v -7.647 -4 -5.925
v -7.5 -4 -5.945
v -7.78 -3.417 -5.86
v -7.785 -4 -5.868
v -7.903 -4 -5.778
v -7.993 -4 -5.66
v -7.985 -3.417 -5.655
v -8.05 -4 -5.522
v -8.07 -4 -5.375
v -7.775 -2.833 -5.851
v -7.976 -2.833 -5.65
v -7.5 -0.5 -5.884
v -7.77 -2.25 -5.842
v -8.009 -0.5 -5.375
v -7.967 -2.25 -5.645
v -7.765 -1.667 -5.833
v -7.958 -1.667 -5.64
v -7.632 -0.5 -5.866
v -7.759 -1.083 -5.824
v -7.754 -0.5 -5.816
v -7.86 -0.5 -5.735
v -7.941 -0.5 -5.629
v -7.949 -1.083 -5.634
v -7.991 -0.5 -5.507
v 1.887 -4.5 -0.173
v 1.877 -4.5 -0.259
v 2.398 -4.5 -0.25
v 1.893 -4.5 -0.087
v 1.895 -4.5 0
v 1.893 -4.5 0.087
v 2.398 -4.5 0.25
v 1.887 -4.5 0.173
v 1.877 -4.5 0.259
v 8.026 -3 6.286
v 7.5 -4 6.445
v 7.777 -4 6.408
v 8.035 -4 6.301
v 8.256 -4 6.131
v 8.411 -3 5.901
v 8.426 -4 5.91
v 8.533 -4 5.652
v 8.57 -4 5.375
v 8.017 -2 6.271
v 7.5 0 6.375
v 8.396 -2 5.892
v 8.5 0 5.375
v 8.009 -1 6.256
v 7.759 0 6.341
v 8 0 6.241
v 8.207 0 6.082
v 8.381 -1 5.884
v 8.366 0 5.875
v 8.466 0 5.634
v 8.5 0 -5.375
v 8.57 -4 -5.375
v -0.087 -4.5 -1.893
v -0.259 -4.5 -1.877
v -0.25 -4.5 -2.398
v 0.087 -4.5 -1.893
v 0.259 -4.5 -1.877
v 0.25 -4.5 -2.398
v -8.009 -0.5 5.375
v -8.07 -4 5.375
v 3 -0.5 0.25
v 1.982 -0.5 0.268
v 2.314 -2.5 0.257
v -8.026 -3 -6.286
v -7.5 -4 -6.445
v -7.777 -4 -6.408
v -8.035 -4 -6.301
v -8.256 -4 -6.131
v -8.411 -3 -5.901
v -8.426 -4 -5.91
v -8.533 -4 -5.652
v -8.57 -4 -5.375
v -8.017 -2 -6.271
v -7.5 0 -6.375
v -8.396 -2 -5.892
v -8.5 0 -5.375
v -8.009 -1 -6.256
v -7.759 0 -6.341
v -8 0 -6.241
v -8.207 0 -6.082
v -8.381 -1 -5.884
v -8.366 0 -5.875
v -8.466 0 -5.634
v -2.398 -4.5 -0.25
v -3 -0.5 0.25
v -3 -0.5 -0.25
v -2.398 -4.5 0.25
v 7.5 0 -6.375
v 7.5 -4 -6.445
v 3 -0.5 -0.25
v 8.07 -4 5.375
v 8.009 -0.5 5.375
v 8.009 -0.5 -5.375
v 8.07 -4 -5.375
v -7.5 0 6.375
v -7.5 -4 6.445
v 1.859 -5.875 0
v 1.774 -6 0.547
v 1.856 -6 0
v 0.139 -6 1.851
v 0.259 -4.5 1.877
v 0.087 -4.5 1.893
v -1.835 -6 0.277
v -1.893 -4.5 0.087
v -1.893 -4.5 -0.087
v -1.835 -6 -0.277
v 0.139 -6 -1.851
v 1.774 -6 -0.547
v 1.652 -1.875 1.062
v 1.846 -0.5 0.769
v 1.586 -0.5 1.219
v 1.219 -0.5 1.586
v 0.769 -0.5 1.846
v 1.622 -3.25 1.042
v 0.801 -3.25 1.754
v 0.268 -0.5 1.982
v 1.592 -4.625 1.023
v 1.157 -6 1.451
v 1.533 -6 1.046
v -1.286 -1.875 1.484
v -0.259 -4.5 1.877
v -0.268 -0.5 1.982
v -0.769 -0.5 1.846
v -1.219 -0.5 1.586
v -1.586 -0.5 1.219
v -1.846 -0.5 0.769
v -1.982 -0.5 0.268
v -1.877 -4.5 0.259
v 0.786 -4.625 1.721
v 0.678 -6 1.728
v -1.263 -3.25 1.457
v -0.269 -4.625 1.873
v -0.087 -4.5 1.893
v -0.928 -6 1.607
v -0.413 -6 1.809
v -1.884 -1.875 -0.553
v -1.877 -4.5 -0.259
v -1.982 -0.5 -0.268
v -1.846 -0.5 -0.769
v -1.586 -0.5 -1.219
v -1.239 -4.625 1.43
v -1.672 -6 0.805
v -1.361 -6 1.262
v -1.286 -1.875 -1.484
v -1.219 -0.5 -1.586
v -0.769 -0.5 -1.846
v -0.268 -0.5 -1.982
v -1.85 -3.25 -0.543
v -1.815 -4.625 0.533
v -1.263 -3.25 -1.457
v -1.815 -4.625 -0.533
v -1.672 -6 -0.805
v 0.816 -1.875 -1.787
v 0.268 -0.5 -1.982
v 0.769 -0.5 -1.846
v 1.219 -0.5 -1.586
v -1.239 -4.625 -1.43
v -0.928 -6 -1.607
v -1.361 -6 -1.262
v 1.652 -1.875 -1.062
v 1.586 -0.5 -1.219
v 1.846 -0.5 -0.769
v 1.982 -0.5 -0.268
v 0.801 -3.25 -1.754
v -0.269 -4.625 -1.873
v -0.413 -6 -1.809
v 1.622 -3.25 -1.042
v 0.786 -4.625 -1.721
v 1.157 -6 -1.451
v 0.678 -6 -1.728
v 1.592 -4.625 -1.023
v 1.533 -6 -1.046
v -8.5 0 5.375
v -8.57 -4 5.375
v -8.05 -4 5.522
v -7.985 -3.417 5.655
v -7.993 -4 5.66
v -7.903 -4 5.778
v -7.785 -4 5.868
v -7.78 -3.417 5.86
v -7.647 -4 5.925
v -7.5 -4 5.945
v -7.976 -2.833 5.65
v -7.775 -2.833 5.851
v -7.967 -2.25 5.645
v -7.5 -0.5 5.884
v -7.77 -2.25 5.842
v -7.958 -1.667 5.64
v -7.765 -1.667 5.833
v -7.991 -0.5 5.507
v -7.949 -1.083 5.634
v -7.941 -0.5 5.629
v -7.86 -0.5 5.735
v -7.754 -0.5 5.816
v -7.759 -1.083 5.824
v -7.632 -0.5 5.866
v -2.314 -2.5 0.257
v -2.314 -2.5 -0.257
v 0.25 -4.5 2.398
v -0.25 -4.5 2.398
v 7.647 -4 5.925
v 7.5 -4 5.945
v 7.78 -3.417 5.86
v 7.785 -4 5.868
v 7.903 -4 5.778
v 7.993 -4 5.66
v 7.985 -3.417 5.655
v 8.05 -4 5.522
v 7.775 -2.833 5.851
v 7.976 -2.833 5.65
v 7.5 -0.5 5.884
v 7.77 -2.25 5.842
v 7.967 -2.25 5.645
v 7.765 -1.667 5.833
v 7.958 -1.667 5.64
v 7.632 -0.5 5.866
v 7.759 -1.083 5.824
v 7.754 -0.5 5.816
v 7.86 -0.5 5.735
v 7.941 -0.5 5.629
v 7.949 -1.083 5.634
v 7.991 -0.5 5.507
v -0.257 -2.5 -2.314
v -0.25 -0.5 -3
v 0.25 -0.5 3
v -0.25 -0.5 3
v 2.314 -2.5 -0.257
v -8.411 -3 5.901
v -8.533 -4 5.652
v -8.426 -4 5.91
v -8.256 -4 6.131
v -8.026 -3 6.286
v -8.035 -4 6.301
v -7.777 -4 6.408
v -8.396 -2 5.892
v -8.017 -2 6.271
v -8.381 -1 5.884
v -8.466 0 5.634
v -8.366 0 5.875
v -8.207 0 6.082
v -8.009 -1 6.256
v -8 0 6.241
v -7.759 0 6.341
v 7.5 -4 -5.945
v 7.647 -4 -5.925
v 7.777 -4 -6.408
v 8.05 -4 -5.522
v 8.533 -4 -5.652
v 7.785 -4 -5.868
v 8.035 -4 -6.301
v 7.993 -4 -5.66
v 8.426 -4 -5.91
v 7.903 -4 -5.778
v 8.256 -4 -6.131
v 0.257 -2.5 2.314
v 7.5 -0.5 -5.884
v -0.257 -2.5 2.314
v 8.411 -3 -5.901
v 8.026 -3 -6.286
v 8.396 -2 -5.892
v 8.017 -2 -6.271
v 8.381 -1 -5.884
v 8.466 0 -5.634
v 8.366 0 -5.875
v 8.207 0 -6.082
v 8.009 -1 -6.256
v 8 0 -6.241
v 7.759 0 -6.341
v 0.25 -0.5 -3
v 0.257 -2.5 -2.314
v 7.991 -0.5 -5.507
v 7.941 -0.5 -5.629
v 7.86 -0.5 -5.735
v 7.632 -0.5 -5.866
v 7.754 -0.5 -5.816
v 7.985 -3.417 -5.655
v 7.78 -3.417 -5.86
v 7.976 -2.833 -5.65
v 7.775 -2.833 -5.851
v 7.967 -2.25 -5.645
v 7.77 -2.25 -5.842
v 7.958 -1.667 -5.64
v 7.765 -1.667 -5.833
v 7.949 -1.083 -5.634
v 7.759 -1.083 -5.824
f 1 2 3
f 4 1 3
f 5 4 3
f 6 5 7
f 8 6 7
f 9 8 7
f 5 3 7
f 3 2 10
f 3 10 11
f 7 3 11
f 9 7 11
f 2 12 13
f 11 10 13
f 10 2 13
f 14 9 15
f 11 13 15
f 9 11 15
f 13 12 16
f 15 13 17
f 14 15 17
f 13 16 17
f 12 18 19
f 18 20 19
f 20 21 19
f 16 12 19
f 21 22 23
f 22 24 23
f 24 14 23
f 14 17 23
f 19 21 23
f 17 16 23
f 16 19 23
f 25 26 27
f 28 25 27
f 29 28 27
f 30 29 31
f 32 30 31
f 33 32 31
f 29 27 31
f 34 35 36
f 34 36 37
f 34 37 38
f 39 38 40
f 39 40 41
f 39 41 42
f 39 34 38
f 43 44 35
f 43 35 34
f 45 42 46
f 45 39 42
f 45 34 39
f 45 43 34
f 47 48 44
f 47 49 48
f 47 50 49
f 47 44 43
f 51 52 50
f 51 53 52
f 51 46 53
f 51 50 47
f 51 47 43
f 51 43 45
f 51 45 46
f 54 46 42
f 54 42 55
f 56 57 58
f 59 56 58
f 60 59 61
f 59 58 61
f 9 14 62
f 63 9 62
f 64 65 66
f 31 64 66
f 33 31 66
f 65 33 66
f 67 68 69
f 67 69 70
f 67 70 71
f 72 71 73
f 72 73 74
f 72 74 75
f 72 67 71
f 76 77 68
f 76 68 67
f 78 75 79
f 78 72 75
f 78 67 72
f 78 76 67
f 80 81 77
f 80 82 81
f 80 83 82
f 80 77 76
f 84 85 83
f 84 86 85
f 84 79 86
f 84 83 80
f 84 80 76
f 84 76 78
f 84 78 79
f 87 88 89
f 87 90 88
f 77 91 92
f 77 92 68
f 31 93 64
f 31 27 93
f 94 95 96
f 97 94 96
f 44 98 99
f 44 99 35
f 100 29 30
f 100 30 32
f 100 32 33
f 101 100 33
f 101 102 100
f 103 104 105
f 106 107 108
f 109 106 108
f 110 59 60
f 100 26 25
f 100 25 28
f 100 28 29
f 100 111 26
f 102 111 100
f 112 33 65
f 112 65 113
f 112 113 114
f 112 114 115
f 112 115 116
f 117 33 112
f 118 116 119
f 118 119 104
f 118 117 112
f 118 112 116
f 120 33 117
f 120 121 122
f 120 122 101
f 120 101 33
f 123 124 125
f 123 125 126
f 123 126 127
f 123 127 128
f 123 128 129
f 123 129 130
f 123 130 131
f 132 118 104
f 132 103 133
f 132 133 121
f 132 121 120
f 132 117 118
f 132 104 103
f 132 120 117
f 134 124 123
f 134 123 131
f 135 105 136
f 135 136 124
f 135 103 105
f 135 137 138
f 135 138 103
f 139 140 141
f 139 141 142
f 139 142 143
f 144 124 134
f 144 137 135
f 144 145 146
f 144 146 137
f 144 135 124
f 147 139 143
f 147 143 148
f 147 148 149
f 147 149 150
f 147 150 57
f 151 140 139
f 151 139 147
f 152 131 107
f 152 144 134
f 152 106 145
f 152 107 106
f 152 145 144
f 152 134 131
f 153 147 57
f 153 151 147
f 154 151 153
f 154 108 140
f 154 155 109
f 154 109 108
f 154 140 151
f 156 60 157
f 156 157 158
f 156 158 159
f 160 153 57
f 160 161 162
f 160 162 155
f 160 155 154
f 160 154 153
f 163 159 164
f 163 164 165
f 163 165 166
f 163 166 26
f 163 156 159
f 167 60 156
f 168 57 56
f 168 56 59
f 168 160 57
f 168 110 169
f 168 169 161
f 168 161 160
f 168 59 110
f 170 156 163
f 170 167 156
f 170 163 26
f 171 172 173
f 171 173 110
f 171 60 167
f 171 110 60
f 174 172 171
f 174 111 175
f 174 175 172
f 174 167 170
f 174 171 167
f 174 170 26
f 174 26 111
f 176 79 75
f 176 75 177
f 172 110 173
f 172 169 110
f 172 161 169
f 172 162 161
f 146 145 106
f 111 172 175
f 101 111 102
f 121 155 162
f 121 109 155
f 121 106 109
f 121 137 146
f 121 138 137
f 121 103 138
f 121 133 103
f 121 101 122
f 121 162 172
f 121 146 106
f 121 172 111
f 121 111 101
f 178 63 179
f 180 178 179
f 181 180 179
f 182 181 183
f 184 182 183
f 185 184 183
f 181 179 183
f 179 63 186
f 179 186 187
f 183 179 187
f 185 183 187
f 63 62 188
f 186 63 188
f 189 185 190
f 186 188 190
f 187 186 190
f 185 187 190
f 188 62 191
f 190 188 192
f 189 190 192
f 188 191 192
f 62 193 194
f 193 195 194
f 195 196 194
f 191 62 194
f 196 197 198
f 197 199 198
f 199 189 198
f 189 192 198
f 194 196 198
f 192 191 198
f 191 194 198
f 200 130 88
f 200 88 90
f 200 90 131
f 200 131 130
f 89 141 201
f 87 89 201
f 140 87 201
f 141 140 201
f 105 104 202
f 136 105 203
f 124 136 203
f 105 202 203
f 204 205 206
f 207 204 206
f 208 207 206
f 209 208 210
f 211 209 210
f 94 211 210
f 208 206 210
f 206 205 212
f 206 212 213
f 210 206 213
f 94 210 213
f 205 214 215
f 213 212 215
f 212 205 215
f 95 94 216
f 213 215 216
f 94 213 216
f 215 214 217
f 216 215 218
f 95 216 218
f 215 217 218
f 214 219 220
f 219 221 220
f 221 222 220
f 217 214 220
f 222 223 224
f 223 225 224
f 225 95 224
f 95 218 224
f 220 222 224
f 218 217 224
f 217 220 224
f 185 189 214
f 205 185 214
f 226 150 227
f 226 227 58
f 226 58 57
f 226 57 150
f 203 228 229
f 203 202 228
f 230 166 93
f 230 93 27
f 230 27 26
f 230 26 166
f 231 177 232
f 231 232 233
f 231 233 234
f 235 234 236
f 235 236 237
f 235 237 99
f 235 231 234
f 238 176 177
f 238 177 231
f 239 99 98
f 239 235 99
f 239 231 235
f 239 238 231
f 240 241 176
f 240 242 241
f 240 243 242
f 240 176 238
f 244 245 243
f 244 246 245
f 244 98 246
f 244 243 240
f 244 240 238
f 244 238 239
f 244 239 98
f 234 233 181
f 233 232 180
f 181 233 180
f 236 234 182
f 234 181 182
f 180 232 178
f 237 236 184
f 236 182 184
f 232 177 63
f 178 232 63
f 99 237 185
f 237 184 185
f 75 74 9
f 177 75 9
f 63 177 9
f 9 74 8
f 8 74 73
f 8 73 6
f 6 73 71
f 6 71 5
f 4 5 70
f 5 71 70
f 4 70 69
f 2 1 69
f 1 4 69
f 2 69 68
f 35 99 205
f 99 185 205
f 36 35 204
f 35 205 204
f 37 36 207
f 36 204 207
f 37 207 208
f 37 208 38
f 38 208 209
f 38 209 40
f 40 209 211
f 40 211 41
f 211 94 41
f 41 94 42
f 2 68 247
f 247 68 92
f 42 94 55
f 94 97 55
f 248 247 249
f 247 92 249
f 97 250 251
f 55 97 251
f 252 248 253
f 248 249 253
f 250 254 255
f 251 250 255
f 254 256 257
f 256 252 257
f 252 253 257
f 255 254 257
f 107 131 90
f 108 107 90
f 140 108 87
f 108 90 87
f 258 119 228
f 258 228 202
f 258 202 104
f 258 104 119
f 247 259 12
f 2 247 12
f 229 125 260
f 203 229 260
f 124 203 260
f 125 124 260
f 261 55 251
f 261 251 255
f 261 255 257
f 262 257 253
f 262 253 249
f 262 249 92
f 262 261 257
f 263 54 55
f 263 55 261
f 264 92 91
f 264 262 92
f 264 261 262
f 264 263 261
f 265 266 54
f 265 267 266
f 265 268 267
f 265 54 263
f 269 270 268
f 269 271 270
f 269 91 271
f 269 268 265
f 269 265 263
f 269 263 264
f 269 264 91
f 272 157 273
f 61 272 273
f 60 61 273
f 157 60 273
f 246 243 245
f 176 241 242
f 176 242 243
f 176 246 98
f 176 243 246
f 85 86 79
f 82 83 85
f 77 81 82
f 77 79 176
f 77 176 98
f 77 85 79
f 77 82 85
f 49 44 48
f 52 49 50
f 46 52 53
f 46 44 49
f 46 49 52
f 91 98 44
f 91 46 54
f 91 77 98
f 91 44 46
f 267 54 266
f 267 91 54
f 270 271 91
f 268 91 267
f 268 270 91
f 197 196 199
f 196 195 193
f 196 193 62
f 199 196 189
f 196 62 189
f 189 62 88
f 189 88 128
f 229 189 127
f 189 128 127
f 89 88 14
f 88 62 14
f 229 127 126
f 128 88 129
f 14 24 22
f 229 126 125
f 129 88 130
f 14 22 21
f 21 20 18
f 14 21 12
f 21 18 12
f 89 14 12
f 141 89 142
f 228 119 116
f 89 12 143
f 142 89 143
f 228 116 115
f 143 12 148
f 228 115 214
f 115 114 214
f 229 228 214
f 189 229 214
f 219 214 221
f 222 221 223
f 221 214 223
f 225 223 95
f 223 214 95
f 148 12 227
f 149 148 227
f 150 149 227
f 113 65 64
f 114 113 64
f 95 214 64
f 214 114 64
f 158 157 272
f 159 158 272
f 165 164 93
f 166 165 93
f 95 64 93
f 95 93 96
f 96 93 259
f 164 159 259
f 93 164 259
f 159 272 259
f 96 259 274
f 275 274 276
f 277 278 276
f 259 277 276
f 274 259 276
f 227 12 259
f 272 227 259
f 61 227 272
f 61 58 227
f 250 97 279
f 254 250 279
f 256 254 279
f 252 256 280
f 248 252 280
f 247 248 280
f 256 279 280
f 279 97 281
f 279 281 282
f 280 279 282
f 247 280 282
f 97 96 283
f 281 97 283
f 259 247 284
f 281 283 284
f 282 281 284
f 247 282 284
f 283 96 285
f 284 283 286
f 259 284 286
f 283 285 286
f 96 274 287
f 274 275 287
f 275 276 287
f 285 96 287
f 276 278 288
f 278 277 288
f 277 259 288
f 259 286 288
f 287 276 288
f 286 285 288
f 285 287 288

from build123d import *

# Parameters (mm, degrees)
BOSS_EXTRUDE1_DEPTH = 4
BOSS_EXTRUDE1_DRAFT = 1
SHELL1_T            = -0.5
SKETCH2_R           = 2
BOSS_EXTRUDE2_DEPTH = 5.5
BOSS_EXTRUDE2_TAPER = 1.5
CIRPATTERN1_COUNT   = 4


with BuildPart() as part:
    # Sketch1 → Boss-Extrude1 (with draft: the straight prism first)
    with BuildSketch(Plane(origin=(0, 0, 0), x_dir=(1, 0, 0), z_dir=(0, 1, 0))):
        with BuildLine():
            Line((-7.5, -6.375), (7.5, -6.375))
            ThreePointArc((7.5, -6.375), (8.207106781, -6.082106781), (8.5, -5.375))
            Line((8.5, -5.375), (8.5, 5.375))
            ThreePointArc((8.5, 5.375), (8.207106781, 6.082106781), (7.5, 6.375))
            Line((7.5, 6.375), (-7.5, 6.375))
            ThreePointArc((-7.5, 6.375), (-8.207106781, 6.082106781), (-8.5, 5.375))
            Line((-8.5, 5.375), (-8.5, -5.375))
            ThreePointArc((-8.5, -5.375), (-8.207106781, -6.082106781), (-7.5, -6.375))
        make_face()
    extrude(amount=-BOSS_EXTRUDE1_DEPTH)
    # Boss-Extrude1: the draft: its side faces are tilted about the plane it starts from
    boss_extrude1_sides = [part.faces().sort_by_distance(p)[0] for p in [
        (0, -2, 6.375),
        (8.207106781, -2, 6.082106781),
        (8.5, -2, 0),
        (8.207106781, -2, -6.082106781),
        (0, -2, -6.375),
        (-8.207106781, -2, -6.082106781),
        (-8.5, -2, 0),
        (-8.207106781, -2, 6.082106781),
    ]]
    draft(boss_extrude1_sides, Plane(origin=(0, 0, 0), x_dir=(1, 0, 0), z_dir=(0, 1, 0)), BOSS_EXTRUDE1_DRAFT)

    # Shell1
    shell1_openings = [part.faces().sort_by_distance(p)[0] for p in [
        (0, -4, 0),
    ]]
    offset(amount=SHELL1_T, openings=shell1_openings, kind=Kind.INTERSECTION)

    # Sketch2 → Boss-Extrude2 (add)
    with BuildSketch(Plane.XZ.offset(0.5)):
        Circle(SKETCH2_R)
    extrude(amount=BOSS_EXTRUDE2_DEPTH, taper=BOSS_EXTRUDE2_TAPER)

    # Rib1: read off the stored shape, not the designer's step
    # Rib1: loft between two sections, ruled curve by curve
    rib1_from = [
        Edge.make_line((1.982020638, -0.5, 0.267570907), (3, -0.5, 0.25)),
        Edge.make_line((1.982020638, -0.5, -0.267570907), (3, -0.5, -0.25)),
        Edge.make_line((3, -0.5, -0.25), (3, -0.5, 0.25)),
        Edge.make_line((1.982020638, -0.5, -0.267570907), (1.982020638, -0.5, 0.267570907)),
    ]
    rib1_to = [
        Edge.make_line((1.87747837, -4.5, 0.258981593), (2.397831467, -4.5, 0.25)),
        Edge.make_line((1.87747837, -4.5, -0.258981593), (2.397831467, -4.5, -0.25)),
        Edge.make_line((2.397831467, -4.5, -0.25), (2.397831467, -4.5, 0.25)),
        Edge.make_line((1.87747837, -4.5, -0.258981593), (1.87747837, -4.5, 0.258981593)),
    ]
    rib1 = Solid(Shell([*[Face.make_surface_from_curves(rib1_from[k], rib1_to[k]) for k in range(4)], Face(Wire(rib1_from)), Face(Wire(rib1_to))]))
    add(rib1)

    # CirPattern1: Rib1 ×4 about axis
    cirpattern1_axis = Axis((0, 0, 0), (0, 1, 0))
    for i in range(1, CIRPATTERN1_COUNT):
        add(rib1.rotate(cirpattern1_axis, i * 360 / CIRPATTERN1_COUNT))


solid = part.part
